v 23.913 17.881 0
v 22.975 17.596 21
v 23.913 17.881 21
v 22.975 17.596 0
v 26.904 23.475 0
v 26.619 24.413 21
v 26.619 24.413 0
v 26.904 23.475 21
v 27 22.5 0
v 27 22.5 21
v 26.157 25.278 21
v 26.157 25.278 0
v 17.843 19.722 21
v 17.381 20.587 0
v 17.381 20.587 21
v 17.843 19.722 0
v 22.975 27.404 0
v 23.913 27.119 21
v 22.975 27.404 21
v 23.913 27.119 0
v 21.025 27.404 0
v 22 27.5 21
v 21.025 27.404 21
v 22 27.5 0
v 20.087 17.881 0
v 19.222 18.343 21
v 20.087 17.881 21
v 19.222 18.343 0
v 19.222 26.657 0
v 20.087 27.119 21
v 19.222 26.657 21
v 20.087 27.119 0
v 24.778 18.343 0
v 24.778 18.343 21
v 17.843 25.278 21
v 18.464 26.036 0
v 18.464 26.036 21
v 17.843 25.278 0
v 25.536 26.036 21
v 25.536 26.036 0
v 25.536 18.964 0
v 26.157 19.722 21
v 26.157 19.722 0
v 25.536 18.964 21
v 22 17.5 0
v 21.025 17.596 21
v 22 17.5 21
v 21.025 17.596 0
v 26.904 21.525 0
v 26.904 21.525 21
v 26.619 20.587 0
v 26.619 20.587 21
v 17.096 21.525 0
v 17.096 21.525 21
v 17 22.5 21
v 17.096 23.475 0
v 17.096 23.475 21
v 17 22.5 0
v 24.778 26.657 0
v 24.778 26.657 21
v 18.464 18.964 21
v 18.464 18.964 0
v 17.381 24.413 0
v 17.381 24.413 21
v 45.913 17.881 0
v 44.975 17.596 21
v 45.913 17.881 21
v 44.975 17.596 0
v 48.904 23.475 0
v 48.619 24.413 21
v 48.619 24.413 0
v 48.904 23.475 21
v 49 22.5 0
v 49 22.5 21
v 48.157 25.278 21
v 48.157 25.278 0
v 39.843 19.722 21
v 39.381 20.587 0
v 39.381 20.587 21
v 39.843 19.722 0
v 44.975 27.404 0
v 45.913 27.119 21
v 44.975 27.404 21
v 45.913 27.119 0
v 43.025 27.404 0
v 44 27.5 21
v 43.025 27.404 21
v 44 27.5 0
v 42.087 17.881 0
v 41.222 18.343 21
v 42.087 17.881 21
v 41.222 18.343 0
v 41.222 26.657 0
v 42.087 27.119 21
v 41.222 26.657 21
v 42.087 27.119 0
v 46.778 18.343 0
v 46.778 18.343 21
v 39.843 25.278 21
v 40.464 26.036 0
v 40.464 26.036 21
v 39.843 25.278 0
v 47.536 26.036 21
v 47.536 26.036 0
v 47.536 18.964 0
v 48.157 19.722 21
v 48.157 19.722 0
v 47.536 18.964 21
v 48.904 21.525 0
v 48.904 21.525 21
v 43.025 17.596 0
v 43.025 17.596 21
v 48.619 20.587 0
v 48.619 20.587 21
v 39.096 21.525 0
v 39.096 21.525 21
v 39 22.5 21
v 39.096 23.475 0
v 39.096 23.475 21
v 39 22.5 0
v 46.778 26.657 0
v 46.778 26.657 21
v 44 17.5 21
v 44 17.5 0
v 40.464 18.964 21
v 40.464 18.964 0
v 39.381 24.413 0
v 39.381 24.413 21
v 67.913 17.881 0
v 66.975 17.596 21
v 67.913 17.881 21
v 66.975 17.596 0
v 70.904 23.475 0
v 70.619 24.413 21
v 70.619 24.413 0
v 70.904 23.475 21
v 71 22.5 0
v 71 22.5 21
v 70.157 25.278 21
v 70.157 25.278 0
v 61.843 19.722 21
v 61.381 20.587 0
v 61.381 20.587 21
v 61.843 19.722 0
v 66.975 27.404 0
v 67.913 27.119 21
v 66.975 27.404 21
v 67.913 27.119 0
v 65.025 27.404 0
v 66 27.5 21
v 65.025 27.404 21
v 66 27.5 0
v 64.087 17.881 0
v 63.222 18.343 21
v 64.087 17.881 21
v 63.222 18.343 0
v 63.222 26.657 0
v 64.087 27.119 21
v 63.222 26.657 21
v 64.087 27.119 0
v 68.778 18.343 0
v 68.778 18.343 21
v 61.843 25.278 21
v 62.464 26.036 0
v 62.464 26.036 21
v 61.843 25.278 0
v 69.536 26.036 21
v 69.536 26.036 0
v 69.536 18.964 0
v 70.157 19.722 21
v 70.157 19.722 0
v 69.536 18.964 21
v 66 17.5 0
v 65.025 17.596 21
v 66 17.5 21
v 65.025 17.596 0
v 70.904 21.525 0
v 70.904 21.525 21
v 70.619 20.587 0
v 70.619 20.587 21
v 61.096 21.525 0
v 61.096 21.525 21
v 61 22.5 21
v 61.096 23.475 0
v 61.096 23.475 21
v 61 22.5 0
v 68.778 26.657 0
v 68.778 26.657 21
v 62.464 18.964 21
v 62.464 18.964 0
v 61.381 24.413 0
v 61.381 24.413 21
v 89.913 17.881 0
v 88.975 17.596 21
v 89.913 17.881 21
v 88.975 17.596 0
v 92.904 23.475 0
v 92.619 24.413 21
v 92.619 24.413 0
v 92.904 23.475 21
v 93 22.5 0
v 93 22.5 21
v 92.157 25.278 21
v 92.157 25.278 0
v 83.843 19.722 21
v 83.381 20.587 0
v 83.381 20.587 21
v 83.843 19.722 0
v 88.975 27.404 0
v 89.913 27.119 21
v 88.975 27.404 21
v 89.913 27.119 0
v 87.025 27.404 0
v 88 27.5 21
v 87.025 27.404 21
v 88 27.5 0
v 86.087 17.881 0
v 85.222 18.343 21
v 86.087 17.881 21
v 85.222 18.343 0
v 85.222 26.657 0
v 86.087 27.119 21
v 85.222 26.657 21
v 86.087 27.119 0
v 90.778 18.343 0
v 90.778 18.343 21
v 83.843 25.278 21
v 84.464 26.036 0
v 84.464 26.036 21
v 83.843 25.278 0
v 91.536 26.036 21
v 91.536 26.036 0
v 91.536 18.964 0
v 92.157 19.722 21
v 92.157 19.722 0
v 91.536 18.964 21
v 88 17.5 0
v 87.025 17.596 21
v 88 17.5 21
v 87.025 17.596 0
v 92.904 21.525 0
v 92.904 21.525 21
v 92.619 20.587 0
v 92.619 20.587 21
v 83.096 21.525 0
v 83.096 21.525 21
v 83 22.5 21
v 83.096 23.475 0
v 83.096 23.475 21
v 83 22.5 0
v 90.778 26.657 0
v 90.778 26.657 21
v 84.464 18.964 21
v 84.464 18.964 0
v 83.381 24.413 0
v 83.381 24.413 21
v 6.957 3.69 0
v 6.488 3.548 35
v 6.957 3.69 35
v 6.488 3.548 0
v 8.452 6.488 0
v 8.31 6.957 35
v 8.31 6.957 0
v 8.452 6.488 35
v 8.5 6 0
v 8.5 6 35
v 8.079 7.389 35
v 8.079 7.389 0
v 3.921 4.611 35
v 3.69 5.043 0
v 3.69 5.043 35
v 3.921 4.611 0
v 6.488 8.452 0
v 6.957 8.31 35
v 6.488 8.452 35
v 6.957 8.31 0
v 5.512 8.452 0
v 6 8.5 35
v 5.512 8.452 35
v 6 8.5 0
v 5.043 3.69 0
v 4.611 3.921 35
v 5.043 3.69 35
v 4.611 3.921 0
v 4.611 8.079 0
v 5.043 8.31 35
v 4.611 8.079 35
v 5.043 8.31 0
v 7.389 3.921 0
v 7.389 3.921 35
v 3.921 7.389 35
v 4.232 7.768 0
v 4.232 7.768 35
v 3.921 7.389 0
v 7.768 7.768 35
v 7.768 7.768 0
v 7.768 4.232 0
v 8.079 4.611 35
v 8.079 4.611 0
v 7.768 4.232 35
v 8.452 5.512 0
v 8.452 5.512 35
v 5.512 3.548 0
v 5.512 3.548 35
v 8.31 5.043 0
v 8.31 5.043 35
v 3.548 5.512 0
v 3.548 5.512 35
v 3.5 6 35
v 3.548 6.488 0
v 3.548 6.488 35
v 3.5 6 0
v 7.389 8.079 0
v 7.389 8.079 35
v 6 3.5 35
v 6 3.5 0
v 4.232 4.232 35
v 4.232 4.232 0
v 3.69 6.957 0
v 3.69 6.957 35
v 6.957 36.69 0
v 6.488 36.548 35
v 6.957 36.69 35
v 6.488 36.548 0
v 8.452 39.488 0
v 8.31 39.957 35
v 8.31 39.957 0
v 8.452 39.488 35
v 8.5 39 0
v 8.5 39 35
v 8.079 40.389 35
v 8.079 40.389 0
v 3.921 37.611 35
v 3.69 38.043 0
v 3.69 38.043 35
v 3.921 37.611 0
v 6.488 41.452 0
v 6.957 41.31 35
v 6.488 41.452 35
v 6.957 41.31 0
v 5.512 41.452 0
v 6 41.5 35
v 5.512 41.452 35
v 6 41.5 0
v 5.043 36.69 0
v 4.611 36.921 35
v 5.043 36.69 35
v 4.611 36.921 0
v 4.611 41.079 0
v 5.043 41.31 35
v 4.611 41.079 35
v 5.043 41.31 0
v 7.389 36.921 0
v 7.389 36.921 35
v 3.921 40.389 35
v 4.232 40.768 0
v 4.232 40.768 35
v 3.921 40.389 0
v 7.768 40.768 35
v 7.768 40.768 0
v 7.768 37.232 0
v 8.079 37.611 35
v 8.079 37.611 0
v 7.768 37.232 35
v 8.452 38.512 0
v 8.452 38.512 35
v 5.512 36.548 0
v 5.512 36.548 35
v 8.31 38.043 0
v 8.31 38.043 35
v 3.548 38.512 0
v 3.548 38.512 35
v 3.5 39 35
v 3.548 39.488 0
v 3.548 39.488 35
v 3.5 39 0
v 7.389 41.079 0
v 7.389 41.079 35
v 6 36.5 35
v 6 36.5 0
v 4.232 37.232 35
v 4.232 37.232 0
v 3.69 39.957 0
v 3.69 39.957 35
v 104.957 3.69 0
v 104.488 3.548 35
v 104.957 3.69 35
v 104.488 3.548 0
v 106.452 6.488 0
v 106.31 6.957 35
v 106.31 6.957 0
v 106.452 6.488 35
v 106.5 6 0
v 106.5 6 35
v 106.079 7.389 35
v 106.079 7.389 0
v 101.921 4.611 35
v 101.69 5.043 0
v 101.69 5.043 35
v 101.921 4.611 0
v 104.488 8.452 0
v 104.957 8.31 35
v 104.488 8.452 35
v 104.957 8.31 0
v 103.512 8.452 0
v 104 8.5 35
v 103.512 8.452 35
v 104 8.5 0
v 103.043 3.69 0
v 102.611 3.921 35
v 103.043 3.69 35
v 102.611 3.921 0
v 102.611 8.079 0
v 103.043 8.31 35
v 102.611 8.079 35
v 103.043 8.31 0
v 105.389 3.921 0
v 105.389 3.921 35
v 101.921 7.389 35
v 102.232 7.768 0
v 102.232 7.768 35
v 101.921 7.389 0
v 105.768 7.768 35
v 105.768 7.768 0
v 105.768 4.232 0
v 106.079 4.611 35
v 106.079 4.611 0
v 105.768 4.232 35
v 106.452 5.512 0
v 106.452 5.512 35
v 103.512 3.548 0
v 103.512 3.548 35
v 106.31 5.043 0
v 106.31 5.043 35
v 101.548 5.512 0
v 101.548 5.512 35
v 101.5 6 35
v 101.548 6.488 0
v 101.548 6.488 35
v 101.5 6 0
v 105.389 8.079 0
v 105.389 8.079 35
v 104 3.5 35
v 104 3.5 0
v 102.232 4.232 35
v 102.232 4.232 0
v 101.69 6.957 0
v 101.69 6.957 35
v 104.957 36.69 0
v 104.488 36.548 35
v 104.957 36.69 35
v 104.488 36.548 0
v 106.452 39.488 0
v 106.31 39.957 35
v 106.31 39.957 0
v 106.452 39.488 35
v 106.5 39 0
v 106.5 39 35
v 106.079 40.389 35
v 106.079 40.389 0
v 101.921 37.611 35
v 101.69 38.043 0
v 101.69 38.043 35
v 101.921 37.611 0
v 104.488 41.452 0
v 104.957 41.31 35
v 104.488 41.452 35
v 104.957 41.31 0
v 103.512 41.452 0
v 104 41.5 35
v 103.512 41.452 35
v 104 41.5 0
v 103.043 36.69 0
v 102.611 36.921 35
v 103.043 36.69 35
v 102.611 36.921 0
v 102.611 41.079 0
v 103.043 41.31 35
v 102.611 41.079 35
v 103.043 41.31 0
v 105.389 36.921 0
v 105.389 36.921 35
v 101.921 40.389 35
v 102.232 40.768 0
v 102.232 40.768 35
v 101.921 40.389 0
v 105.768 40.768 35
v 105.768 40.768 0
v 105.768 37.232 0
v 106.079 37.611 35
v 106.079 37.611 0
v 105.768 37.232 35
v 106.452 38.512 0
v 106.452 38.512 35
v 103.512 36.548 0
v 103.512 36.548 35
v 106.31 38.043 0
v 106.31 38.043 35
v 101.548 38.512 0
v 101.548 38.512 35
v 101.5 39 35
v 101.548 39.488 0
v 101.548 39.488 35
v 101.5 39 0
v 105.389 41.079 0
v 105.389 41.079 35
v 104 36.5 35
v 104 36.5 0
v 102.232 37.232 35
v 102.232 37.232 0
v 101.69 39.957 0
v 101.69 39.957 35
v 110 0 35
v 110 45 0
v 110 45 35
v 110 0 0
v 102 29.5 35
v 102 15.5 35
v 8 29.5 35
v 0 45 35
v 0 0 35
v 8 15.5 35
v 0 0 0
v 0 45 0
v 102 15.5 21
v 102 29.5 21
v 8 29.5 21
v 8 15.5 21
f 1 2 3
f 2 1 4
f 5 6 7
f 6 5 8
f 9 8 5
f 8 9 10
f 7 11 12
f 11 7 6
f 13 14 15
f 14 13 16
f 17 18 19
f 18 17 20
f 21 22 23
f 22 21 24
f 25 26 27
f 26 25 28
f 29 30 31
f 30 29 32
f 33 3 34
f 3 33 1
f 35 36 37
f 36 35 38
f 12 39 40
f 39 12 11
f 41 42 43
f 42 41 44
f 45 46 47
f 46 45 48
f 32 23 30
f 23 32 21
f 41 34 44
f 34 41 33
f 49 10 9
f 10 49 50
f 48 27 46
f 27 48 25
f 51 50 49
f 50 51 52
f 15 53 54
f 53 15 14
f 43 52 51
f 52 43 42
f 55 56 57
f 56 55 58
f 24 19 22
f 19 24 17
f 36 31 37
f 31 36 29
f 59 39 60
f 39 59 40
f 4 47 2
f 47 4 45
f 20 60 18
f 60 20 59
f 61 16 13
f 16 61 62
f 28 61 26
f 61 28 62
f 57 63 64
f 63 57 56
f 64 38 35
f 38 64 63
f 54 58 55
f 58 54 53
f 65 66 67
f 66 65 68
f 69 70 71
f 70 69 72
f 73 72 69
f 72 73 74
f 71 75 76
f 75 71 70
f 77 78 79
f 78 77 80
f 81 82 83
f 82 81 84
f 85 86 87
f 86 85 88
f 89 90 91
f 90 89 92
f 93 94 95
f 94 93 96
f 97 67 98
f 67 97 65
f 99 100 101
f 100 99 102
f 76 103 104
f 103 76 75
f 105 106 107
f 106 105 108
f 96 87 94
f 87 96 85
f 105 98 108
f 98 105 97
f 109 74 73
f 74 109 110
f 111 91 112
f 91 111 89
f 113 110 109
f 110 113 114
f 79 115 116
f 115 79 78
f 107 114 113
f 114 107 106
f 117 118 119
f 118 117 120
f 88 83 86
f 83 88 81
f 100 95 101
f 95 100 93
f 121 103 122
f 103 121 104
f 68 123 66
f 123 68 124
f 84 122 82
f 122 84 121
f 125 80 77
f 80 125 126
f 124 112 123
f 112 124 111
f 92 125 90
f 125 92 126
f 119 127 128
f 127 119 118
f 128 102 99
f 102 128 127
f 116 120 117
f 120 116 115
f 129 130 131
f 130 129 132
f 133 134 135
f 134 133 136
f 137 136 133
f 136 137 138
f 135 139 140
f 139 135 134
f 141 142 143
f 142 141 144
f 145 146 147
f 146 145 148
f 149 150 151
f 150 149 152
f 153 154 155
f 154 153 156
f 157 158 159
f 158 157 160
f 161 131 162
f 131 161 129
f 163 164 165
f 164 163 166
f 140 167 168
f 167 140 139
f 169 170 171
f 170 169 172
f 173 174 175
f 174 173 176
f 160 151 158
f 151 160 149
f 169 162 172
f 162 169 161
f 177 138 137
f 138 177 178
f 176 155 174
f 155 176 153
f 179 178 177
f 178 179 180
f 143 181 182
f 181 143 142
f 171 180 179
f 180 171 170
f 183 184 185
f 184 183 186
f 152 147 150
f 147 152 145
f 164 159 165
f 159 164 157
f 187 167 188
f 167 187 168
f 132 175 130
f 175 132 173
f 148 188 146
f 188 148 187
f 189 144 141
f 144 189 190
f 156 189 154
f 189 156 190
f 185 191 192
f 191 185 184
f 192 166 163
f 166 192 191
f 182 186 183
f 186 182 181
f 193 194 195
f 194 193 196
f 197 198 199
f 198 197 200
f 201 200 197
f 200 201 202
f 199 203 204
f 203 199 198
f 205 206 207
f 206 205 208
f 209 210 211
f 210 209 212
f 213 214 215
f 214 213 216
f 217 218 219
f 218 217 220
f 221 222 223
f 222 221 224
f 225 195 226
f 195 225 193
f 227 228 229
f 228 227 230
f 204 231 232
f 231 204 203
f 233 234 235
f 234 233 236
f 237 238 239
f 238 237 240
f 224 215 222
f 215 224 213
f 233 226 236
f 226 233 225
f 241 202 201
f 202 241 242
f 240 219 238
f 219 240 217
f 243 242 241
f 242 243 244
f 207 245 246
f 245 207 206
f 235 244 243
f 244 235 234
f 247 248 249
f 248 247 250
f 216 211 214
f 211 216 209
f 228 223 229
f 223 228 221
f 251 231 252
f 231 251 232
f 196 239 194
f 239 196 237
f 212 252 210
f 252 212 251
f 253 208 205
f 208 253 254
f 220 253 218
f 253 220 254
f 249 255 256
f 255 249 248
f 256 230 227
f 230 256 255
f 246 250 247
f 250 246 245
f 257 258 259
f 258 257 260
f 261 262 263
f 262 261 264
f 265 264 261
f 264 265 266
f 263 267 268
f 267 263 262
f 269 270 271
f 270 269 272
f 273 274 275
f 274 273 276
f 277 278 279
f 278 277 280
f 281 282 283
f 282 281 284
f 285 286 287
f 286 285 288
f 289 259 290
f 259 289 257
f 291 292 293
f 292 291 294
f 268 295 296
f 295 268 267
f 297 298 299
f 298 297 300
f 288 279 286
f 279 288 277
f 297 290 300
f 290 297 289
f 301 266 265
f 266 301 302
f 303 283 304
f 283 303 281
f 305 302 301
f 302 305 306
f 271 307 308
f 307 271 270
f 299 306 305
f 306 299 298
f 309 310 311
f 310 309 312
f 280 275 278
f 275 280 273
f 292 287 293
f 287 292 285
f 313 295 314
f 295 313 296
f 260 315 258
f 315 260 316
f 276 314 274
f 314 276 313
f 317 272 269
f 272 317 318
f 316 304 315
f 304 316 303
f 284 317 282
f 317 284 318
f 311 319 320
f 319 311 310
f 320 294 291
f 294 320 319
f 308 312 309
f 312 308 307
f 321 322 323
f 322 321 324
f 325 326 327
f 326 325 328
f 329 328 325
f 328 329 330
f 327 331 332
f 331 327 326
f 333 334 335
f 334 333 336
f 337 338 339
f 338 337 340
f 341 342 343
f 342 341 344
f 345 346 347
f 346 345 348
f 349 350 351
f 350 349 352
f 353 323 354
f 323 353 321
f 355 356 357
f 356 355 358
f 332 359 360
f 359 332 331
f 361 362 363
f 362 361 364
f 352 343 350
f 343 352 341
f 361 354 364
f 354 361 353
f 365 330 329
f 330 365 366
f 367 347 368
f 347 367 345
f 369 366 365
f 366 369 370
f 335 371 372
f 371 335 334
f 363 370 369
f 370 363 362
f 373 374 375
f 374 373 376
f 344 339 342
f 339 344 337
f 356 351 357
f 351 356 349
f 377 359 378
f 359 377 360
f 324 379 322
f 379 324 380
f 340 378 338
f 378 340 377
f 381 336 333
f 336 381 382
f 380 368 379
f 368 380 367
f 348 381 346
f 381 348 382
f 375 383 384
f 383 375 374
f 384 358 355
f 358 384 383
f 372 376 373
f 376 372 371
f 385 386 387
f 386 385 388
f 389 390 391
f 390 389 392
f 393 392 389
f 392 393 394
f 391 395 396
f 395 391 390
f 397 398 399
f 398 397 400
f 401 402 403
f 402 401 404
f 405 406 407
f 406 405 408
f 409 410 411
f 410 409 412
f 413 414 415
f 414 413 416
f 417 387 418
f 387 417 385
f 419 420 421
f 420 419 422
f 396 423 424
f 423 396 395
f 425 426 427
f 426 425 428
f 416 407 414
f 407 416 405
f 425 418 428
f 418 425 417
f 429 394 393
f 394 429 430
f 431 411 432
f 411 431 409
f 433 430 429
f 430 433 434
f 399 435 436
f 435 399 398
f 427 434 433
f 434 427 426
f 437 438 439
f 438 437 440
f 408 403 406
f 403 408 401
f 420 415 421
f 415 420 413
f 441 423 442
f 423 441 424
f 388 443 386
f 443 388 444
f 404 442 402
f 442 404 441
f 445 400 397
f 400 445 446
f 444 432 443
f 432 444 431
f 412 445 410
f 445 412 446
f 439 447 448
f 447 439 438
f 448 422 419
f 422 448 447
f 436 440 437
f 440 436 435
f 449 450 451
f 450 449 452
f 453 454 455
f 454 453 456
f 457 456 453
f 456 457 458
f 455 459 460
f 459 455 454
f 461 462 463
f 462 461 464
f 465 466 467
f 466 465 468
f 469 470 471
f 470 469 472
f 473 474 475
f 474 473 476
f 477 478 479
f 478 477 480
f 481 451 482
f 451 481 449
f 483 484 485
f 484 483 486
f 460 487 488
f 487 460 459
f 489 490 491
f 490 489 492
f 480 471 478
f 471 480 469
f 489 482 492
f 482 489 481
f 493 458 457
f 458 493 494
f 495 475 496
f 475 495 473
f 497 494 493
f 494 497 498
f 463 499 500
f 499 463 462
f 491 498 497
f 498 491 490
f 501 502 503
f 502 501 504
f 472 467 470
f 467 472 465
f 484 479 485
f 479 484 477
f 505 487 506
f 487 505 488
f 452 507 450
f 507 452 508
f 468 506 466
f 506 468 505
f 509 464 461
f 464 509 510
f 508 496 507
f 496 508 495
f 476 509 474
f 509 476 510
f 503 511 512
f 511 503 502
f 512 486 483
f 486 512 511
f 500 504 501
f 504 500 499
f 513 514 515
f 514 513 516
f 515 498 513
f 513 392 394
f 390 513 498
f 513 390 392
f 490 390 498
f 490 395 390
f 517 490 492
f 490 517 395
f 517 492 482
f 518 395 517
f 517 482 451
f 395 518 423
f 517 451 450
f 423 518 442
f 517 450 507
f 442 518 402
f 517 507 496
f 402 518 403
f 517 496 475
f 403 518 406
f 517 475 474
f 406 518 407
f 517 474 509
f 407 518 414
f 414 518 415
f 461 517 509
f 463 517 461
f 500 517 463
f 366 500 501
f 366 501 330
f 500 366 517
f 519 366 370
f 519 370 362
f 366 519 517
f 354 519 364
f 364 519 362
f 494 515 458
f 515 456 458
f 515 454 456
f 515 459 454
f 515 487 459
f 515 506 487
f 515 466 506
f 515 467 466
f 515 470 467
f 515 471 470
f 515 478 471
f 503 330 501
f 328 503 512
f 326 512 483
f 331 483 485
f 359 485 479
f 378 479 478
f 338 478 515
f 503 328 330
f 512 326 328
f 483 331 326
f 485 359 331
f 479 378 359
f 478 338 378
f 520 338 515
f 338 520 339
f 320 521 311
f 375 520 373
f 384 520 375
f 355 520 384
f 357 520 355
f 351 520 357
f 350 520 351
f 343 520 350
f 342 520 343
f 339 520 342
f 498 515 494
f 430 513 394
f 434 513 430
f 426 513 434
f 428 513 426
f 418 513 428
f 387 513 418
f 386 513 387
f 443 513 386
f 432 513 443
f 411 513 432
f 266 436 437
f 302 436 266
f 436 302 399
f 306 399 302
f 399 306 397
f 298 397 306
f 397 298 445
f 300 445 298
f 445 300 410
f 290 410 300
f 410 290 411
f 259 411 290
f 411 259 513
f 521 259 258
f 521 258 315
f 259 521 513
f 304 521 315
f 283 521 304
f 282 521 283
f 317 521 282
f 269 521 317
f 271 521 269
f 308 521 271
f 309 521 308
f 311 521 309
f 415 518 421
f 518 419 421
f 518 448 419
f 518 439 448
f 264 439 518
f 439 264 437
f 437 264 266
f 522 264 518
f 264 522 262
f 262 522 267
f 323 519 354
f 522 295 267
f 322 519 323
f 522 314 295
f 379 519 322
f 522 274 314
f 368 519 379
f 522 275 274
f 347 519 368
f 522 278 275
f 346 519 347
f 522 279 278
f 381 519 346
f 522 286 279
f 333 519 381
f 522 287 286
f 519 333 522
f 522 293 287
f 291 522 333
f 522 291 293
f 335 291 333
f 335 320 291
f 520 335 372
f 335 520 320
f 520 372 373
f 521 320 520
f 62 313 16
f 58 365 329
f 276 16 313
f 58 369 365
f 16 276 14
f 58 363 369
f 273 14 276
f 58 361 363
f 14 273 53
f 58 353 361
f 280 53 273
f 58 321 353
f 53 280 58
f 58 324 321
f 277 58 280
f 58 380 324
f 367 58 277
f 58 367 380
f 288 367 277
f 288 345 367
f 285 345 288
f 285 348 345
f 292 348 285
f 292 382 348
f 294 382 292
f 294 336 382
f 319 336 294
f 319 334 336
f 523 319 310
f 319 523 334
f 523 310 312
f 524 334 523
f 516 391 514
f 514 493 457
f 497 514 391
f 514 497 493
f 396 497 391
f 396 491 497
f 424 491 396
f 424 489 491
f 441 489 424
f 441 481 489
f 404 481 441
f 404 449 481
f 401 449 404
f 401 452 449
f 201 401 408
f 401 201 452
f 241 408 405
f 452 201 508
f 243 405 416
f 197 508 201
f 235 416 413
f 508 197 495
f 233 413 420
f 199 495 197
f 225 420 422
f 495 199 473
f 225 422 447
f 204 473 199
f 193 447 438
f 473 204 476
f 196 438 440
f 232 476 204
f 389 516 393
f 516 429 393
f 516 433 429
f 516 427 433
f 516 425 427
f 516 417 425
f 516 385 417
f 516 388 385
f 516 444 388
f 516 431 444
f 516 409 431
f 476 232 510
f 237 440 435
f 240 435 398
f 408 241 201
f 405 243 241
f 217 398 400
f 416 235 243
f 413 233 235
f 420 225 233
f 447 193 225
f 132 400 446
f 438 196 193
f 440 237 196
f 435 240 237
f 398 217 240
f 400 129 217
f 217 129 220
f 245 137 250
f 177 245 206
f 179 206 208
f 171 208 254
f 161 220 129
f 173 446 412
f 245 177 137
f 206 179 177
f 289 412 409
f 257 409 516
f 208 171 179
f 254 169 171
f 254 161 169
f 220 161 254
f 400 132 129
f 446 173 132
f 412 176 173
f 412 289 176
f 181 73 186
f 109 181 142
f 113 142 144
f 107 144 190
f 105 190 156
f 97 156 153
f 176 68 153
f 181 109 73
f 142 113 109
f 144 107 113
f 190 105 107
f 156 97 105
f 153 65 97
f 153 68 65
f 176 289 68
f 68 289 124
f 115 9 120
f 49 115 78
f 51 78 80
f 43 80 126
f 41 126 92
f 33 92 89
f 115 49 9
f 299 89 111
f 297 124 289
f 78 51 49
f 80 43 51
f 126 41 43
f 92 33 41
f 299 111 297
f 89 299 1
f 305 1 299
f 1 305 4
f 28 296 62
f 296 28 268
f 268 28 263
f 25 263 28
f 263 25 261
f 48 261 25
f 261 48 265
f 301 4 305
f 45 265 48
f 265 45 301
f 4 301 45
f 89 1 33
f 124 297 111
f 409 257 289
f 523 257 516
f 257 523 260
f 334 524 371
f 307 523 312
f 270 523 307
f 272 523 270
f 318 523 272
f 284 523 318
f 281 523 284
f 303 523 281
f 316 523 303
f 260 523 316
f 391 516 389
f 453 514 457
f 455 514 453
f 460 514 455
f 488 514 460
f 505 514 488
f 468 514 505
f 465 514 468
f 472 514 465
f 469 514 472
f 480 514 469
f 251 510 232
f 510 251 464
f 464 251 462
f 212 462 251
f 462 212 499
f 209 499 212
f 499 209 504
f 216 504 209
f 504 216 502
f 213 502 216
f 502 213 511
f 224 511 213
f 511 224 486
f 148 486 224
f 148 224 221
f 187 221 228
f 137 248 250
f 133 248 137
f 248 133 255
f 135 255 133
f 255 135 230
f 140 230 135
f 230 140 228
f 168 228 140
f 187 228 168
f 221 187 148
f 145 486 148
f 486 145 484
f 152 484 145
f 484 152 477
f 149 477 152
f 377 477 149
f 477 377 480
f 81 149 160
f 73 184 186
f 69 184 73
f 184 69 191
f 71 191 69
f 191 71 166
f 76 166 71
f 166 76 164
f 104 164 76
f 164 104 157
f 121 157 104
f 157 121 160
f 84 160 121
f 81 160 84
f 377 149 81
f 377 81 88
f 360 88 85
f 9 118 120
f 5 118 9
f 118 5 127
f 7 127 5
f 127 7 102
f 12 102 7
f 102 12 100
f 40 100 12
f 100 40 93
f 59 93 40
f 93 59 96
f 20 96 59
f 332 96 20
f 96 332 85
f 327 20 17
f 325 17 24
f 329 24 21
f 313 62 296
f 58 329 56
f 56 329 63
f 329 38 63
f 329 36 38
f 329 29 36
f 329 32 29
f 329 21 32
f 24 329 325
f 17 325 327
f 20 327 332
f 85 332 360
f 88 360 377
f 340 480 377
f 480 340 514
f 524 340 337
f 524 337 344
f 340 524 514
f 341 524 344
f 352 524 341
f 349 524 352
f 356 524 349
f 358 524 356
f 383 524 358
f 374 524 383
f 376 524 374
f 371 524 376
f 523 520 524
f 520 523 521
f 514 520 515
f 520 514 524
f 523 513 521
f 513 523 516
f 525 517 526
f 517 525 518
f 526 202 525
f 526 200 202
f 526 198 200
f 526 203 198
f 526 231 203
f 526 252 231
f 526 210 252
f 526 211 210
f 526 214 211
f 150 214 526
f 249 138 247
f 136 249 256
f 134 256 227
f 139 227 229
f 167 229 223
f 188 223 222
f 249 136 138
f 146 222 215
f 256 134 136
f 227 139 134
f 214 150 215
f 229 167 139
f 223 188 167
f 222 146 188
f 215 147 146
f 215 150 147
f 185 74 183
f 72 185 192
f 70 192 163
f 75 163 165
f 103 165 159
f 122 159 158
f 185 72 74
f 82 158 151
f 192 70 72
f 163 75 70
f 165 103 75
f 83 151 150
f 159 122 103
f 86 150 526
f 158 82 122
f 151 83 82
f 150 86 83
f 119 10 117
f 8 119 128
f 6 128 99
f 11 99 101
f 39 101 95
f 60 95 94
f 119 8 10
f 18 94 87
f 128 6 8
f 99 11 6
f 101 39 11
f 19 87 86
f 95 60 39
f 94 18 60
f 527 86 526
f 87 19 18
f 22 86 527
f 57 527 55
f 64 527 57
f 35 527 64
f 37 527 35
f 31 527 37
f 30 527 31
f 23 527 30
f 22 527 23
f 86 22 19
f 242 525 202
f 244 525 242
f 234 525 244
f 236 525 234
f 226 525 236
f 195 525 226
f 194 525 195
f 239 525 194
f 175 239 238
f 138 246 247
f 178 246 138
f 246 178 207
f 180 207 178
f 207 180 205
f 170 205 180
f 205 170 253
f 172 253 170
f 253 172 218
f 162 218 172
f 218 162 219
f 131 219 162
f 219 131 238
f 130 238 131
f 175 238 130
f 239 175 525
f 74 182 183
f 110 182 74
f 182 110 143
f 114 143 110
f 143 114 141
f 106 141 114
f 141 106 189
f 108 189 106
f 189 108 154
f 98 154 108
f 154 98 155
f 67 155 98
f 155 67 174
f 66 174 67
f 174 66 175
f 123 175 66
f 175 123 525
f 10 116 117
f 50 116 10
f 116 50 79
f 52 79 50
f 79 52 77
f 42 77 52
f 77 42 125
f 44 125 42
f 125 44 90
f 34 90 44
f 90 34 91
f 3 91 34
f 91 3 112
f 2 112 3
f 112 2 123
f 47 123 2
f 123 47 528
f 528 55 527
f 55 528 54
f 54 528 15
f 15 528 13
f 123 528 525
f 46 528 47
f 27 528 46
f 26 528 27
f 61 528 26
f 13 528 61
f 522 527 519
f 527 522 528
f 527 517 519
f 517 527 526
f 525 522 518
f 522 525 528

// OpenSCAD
$fn = 32;

// ----------------------------------------------------------------------
// Manifold block: gallery_top manifold
// ----------------------------------------------------------------------

// --- parameters (mm) ---
block_l = 110;            // block length, X
block_w = 45;             // block width, Y
block_h = 35;             // block height, Z
port_d = 10;              // port bore diameter
port_pitch = 22;          // port pitch along X
gallery_d = 14;           // top gallery width, Y
gallery_depth = 14;       // gallery pocket depth
wall_p = 8;               // gallery end wall thickness, X
mnt_d = 5;                // mounting hole diameter
mnt_in = 6;               // mounting hole inset from the edges

n_ports = 4;  // ports in the row
port_x0 = (block_l - (n_ports - 1) * port_pitch) / 2;  // first port X

difference() {
  cube([block_l, block_w, block_h]);
  for (i = [0 : n_ports - 1])
    translate([port_x0 + i * port_pitch, block_w / 2, -1])
      cylinder(h = block_h + 2, d = port_d);
  translate([wall_p, block_w / 2 - gallery_d / 2, block_h - gallery_depth])
    cube([block_l - 2 * wall_p, gallery_d, gallery_depth + 1]);
  for (cx = [mnt_in, block_l - mnt_in])
    for (cy = [mnt_in, block_w - mnt_in])
      translate([cx, cy, -1]) cylinder(h = block_h + 2, d = mnt_d);
}
